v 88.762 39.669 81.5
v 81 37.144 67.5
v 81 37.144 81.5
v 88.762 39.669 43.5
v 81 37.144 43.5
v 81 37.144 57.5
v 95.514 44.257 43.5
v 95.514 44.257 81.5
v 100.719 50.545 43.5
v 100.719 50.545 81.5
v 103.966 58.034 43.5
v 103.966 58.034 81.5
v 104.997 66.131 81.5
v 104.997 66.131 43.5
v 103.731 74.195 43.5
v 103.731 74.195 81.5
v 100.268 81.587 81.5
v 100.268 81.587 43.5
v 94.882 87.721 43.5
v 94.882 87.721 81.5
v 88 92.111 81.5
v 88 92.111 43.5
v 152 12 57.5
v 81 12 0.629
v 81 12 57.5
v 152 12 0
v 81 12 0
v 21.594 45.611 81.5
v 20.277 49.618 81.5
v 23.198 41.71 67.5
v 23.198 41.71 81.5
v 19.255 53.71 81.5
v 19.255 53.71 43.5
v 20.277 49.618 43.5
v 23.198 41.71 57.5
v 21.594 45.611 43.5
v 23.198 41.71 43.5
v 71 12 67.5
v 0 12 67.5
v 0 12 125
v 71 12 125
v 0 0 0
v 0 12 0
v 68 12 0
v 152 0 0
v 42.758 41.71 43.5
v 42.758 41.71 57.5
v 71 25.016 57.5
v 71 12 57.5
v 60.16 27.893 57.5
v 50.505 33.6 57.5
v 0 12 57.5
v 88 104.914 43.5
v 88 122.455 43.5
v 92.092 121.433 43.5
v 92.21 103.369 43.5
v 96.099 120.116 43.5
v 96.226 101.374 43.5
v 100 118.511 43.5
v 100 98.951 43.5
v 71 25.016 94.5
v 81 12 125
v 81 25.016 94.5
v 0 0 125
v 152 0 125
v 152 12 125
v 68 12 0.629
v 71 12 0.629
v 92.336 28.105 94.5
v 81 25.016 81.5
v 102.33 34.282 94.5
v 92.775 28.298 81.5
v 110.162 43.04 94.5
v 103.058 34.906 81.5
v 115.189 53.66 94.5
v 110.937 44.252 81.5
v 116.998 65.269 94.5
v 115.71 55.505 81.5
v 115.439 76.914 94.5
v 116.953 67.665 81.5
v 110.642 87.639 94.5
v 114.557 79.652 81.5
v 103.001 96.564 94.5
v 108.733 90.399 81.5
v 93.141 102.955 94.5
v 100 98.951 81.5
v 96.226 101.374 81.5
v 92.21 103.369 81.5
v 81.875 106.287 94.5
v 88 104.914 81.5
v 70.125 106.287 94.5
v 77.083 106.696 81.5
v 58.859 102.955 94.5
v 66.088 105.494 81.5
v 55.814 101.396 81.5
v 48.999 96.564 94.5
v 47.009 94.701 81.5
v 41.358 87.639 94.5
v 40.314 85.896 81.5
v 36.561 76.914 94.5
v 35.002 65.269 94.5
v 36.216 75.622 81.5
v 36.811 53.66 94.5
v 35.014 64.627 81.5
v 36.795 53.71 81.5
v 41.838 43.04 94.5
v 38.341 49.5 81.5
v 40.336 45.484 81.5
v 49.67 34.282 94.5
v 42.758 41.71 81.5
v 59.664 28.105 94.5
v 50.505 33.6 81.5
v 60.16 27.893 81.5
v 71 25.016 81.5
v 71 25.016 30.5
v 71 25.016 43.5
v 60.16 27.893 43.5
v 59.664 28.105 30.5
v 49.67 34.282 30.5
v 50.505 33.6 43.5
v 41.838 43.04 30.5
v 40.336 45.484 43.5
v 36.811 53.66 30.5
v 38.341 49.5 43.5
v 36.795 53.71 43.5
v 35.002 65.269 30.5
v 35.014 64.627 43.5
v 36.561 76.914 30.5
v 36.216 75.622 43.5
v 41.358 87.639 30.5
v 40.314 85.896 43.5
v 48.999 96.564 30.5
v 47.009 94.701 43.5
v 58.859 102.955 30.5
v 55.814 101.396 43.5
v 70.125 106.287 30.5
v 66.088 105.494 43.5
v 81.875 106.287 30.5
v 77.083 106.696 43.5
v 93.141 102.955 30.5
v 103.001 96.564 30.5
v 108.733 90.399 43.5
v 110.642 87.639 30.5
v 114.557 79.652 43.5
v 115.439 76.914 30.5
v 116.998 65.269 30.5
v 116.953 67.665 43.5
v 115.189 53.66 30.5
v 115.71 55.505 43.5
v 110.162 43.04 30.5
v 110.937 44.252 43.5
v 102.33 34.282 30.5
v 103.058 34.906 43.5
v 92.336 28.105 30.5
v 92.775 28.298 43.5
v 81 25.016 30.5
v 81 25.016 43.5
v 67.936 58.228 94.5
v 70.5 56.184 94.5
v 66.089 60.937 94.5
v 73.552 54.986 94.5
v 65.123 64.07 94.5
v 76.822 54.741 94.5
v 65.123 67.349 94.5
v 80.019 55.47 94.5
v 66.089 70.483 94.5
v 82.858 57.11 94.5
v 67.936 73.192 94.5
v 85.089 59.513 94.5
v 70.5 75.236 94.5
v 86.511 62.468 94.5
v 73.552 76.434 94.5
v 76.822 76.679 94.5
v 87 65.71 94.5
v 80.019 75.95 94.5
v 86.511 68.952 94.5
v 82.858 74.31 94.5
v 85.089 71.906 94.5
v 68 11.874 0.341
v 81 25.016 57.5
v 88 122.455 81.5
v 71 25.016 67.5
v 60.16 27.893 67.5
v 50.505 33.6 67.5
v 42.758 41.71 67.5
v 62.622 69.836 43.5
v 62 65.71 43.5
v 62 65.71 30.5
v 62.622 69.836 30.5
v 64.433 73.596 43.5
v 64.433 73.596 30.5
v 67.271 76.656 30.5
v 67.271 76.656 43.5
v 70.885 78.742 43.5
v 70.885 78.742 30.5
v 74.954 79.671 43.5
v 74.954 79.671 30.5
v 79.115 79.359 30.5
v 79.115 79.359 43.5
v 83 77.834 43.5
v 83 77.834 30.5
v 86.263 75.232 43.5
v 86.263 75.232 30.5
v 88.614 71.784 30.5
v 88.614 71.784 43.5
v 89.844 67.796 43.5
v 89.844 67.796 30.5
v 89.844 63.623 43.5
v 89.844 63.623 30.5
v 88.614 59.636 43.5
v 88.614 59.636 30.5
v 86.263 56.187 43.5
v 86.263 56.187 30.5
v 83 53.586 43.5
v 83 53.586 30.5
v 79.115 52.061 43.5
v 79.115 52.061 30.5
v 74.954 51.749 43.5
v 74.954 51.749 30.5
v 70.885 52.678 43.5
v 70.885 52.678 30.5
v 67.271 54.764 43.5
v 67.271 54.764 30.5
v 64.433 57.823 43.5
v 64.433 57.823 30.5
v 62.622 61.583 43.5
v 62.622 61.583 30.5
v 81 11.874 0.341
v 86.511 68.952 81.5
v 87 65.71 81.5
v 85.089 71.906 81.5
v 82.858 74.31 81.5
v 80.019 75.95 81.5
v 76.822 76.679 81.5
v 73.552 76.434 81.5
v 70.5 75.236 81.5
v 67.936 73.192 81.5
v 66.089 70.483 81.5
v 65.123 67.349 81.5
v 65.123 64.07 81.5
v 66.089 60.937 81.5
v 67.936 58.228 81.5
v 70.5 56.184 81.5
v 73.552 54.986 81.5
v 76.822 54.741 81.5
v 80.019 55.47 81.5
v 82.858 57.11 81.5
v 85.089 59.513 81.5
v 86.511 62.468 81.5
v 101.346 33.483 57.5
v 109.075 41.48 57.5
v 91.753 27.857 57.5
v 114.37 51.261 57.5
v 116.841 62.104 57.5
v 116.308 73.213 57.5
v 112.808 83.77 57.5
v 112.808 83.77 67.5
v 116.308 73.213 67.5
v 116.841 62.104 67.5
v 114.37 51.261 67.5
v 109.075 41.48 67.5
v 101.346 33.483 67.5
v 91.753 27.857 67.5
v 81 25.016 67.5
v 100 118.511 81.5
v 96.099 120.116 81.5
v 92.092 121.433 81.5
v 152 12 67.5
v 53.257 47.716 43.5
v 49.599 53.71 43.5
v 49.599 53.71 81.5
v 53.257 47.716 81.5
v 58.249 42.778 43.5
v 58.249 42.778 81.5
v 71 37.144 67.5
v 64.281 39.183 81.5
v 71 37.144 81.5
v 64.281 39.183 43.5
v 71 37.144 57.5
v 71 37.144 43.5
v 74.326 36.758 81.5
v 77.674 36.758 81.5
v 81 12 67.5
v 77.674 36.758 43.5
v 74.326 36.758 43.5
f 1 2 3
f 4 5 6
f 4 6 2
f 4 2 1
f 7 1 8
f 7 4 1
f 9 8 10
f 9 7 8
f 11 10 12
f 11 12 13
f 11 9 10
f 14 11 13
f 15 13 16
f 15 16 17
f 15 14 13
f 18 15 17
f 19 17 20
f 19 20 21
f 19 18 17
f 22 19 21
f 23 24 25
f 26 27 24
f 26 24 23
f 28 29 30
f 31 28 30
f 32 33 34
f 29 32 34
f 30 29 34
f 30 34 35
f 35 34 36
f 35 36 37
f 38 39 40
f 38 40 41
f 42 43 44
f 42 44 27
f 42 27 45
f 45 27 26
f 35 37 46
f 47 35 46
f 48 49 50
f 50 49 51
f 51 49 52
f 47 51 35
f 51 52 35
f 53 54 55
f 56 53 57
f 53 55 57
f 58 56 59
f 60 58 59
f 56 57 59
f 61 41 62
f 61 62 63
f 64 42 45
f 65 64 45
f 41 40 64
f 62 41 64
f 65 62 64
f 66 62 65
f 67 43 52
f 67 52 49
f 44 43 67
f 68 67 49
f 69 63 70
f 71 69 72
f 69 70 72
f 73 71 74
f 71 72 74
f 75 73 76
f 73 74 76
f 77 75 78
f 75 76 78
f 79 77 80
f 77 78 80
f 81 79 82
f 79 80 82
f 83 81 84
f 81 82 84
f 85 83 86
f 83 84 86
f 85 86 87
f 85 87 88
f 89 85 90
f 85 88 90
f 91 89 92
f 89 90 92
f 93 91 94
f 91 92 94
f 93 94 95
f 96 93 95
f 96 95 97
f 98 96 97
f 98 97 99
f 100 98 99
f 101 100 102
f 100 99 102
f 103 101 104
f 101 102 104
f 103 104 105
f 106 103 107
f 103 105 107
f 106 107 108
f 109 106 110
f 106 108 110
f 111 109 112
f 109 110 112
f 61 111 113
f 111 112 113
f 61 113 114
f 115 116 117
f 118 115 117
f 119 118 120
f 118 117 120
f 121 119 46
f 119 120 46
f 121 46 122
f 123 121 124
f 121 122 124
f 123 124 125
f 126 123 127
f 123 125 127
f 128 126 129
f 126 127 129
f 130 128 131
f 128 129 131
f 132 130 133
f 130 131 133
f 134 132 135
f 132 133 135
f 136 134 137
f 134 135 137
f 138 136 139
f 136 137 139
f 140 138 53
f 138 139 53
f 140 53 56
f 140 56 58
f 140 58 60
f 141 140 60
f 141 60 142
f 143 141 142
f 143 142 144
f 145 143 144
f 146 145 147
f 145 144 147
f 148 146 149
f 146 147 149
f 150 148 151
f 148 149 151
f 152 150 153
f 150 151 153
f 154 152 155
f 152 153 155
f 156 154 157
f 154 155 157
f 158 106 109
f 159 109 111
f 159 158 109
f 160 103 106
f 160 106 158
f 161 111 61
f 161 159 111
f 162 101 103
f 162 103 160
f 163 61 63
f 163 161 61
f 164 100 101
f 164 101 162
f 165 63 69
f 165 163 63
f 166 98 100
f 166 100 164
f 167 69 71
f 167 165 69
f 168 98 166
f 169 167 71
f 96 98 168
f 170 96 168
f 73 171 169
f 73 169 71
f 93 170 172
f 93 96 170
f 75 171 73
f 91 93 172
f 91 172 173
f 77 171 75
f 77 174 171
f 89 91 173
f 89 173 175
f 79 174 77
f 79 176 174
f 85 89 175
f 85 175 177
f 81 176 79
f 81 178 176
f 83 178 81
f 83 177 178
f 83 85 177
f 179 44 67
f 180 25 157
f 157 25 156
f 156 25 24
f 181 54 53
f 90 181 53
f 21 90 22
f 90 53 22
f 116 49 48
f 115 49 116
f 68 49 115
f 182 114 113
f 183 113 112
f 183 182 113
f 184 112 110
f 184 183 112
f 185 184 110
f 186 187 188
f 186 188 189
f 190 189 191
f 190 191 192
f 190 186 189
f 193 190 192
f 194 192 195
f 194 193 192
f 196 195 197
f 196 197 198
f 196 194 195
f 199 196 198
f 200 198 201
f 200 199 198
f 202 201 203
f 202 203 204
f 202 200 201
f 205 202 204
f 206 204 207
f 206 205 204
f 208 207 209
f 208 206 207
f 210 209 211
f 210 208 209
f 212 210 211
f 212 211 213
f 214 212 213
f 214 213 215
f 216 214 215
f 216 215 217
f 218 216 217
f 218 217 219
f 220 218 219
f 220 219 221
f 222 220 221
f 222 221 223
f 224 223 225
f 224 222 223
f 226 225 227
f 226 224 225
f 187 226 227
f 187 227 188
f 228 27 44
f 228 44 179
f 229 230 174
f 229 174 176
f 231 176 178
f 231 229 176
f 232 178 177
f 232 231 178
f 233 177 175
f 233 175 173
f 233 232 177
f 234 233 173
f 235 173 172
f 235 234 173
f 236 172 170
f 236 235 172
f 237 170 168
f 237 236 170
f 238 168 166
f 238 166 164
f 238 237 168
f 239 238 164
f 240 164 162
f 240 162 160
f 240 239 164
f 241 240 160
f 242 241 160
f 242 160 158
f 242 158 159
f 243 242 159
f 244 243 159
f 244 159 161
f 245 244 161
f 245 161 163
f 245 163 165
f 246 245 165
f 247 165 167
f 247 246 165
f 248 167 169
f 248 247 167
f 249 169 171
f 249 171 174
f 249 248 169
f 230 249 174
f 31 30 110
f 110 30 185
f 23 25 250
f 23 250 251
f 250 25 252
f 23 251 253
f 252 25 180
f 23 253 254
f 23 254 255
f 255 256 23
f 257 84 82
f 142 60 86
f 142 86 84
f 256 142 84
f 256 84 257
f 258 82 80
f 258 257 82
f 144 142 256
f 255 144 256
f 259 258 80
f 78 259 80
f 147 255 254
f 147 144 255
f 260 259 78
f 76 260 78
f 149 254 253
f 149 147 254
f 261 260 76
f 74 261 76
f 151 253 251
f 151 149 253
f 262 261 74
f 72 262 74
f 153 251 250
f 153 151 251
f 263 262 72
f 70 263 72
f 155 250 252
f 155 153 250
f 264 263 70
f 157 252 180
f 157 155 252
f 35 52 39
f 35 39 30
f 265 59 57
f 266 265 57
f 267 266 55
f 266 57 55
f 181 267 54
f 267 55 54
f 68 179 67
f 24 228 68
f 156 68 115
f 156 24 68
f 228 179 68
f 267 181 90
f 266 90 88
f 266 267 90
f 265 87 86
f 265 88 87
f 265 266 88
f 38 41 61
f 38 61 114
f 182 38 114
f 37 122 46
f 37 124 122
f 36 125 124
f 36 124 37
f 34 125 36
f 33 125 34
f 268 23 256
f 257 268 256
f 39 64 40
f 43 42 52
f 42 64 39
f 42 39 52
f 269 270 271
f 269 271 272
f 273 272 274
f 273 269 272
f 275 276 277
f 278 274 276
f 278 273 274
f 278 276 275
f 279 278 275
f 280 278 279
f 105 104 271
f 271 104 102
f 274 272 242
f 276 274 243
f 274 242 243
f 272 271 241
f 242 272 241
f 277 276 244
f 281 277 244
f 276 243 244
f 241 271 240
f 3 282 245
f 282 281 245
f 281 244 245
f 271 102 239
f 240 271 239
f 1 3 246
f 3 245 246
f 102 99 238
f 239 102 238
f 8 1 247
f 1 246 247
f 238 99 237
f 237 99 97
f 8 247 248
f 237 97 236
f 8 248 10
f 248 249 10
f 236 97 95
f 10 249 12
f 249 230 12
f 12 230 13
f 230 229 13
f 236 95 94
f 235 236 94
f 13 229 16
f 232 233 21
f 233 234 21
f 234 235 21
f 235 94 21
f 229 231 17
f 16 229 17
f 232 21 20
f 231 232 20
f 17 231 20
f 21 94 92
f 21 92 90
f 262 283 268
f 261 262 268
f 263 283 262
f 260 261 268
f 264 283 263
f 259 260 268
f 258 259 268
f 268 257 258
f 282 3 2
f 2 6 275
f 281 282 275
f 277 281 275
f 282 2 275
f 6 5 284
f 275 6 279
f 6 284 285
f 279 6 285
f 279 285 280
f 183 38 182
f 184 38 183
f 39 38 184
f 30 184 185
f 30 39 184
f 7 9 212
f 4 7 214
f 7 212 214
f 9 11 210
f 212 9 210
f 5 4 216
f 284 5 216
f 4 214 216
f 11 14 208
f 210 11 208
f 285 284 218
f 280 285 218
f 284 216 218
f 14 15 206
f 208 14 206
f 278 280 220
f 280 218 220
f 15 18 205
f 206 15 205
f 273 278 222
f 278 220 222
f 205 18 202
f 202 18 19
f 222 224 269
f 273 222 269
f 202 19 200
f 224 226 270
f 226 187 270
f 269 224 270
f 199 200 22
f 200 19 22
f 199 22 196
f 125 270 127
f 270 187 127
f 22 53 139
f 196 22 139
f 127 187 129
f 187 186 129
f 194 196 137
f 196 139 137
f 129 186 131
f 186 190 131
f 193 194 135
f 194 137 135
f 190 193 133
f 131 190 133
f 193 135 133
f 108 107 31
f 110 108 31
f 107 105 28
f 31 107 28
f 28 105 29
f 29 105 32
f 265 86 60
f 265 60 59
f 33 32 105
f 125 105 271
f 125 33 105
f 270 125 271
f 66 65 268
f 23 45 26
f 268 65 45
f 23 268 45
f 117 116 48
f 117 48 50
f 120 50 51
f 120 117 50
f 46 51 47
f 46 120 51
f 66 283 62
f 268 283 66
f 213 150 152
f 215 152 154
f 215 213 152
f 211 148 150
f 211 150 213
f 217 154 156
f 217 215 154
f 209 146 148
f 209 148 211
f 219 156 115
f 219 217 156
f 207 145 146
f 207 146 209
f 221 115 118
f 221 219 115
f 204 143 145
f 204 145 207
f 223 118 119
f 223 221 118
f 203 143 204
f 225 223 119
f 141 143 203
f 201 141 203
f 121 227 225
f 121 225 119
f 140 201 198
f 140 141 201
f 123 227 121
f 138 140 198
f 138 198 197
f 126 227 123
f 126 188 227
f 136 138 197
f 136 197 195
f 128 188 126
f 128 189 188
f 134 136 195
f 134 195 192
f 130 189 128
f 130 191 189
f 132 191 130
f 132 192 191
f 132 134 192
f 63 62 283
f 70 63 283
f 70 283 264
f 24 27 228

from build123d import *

# Parameters (mm, degrees)
SKETCH1_W           = 152
SKETCH1_H           = 12
BOSS_EXTRUDE1_DEPTH = 125
SKETCH3_W           = 10
SKETCH3_H           = 85
BOSS_EXTRUDE2_DEPTH = 152
SKETCH4_W           = 10
SKETCH4_H           = 39
BOSS_EXTRUDE3_DEPTH = 125
BOSS_EXTRUDE4_DEPTH = 38
BOSS_EXTRUDE5_DEPTH = 38
CUT_EXTRUDE1_DEPTH  = 38
CUT_EXTRUDE2_DEPTH  = 38
SKETCH10_R          = 41
SKETCH10_R_2        = 14
BOSS_EXTRUDE6_DEPTH = 13
CUT_EXTRUDE4_DEPTH  = 13
SKETCH13_R          = 29
CUT_EXTRUDE5_DEPTH  = 38
SKETCH14_R          = 41
SKETCH14_R_2        = 11
BOSS_EXTRUDE8_DEPTH = 13
CUT_EXTRUDE6_DEPTH  = 13


with BuildPart() as part:
    # Sketch1 → Boss-Extrude1 (new body)
    with BuildSketch(Plane.XY):
        with Locations((76, 6)):
            Rectangle(SKETCH1_W, SKETCH1_H)
    extrude(amount=BOSS_EXTRUDE1_DEPTH)

    # Sketch3 → Boss-Extrude2 (add)
    with BuildSketch(Plane(origin=(0, 0, 0), x_dir=(0, 0, -1), z_dir=(1, 0, 0))):
        with Locations((-62.5, 54.5)):
            Rectangle(SKETCH3_W, SKETCH3_H)
    extrude(amount=BOSS_EXTRUDE2_DEPTH)

    # Sketch4 → Boss-Extrude3 (add)
    with BuildSketch(Plane.XY):
        with Locations((76, 31.5)):
            Rectangle(SKETCH4_W, SKETCH4_H)
    extrude(amount=BOSS_EXTRUDE3_DEPTH)

    # Sketch5 → Boss-Extrude4 (add)
    with BuildSketch(Plane(origin=(0, 0, 43.5), x_dir=(-1, 0, 0), z_dir=(0, 0, -1))):
        with BuildLine():
            Line((-36.795408432, 53.709899764), (-49.599242435, 53.709899764))
            ThreePointArc((-49.599242435, 53.709899764), (-96.506096654, 45.20380311), (-88, 92.110657329))
            Line((-88, 92.110657329), (-88, 104.914491332))
            ThreePointArc((-88, 104.914491332), (-104.991378029, 36.718521736), (-36.795408432, 53.709899764))
        make_face()
    extrude(amount=-BOSS_EXTRUDE4_DEPTH)

    # Sketch7 → Boss-Extrude5 (add)
    with BuildSketch(Plane(origin=(0, 0, 43.5), x_dir=(-1, 0, 0), z_dir=(0, 0, -1))):
        with BuildLine():
            ThreePointArc((-88, 104.914491332), (-94.245259526, 102.42652413), (-100, 98.951440042))
            Line((-100, 98.951440042), (-100, 118.511414894))
            ThreePointArc((-100, 118.511414894), (-94.107673916, 120.810826665), (-88, 122.454943601))
            Line((-88, 122.454943601), (-88, 104.914491332))
        make_face()
        with BuildLine():
            Line((-23.19848487, 41.709899764), (-42.758459723, 41.709899764))
            ThreePointArc((-42.758459723, 41.709899764), (-39.283375634, 47.464640238), (-36.795408432, 53.709899764))
            Line((-36.795408432, 53.709899764), (-19.254956164, 53.709899764))
            ThreePointArc((-19.254956164, 53.709899764), (-20.899073099, 47.602225848), (-23.19848487, 41.709899764))
        make_face()
    extrude(amount=-BOSS_EXTRUDE5_DEPTH)

    # Sketch8 → Cut-Extrude1 (cut)
    with BuildSketch(Plane(origin=(0, 0, 57.5), x_dir=(-1, 0, 0), z_dir=(0, 0, -1))):
        with BuildLine():
            Line((-152, 12), (-112.808217889, 83.76966432))
            ThreePointArc((-112.808217889, 83.76966432), (-108.334991946, 90.917999571), (-102.493954541, 97))
            Line((-102.493954541, 97), (-152, 97))
            Line((-152, 97), (-152, 12))
        make_face()
    extrude(amount=-CUT_EXTRUDE1_DEPTH, mode=Mode.SUBTRACT)

    # Sketch9 → Cut-Extrude2 (cut)
    with BuildSketch(Plane(origin=(0, 0, 43.5), x_dir=(-1, 0, 0), z_dir=(0, 0, -1))):
        with BuildLine():
            Line((0, 12), (-23.19848487, 41.709899764))
            ThreePointArc((-23.19848487, 41.709899764), (-20.899073099, 47.602225848), (-19.254956164, 53.709899764))
            Line((-19.254956164, 53.709899764), (-49.599242435, 53.709899764))
            ThreePointArc((-49.599242435, 53.709899764), (-58.248729295, 42.777556047), (-71, 37.14418605))
            Line((-71, 37.14418605), (-71, 51))
            Line((-71, 51), (-81, 51))
            Line((-81, 51), (-81, 37.14418605))
            ThreePointArc((-81, 37.14418605), (-104.767659641, 62.046327903), (-88, 92.110657329))
            Line((-88, 92.110657329), (-88, 97))
            Line((-88, 97), (0, 97))
            Line((0, 97), (0, 12))
        make_face()
    extrude(amount=-CUT_EXTRUDE2_DEPTH, mode=Mode.SUBTRACT)

    # Sketch10 → Boss-Extrude6 (add)
    with BuildSketch(Plane(origin=(0, 0, 43.5), x_dir=(-1, 0, 0), z_dir=(0, 0, -1))):
        with Locations((-76, 65.709899764)):
            Circle(SKETCH10_R)
        with Locations((-76, 65.709899764)):
            Circle(SKETCH10_R_2, mode=Mode.SUBTRACT)
    extrude(amount=BOSS_EXTRUDE6_DEPTH)

    # Sketch11 → Cut-Extrude4 (cut)
    with BuildSketch(Plane(origin=(81, 0, 0), x_dir=(0, 0, -1), z_dir=(1, 0, 0))):
        Polygon((-30.5, 25.015919866), (-30.5, 51), (0, 51), (0, 12), (-0.340530313, 11.874434651), align=None)
    extrude(amount=-CUT_EXTRUDE4_DEPTH, mode=Mode.SUBTRACT)

    # Sketch13 → Cut-Extrude5 (cut)
    with BuildSketch(Plane(origin=(0, 0, 43.5), x_dir=(-1, 0, 0), z_dir=(0, 0, -1))):
        with Locations((-76, 65.709899764)):
            Circle(SKETCH13_R)
    extrude(amount=-CUT_EXTRUDE5_DEPTH, mode=Mode.SUBTRACT)

    # Sketch14 → Boss-Extrude8 (add)
    with BuildSketch(Plane.XY.offset(81.5)):
        with Locations((76, 65.709899764)):
            Circle(SKETCH14_R)
        with Locations((76, 65.709899764)):
            Circle(SKETCH14_R_2, mode=Mode.SUBTRACT)
    extrude(amount=BOSS_EXTRUDE8_DEPTH)

    # Sketch15 → Cut-Extrude6 (cut)
    with BuildSketch(Plane.ZY.offset(-71)):
        Polygon((125, 12), (94.5, 25.015919866), (94.5, 51), (125, 51), align=None)
    extrude(amount=-CUT_EXTRUDE6_DEPTH, mode=Mode.SUBTRACT)


solid = part.part
